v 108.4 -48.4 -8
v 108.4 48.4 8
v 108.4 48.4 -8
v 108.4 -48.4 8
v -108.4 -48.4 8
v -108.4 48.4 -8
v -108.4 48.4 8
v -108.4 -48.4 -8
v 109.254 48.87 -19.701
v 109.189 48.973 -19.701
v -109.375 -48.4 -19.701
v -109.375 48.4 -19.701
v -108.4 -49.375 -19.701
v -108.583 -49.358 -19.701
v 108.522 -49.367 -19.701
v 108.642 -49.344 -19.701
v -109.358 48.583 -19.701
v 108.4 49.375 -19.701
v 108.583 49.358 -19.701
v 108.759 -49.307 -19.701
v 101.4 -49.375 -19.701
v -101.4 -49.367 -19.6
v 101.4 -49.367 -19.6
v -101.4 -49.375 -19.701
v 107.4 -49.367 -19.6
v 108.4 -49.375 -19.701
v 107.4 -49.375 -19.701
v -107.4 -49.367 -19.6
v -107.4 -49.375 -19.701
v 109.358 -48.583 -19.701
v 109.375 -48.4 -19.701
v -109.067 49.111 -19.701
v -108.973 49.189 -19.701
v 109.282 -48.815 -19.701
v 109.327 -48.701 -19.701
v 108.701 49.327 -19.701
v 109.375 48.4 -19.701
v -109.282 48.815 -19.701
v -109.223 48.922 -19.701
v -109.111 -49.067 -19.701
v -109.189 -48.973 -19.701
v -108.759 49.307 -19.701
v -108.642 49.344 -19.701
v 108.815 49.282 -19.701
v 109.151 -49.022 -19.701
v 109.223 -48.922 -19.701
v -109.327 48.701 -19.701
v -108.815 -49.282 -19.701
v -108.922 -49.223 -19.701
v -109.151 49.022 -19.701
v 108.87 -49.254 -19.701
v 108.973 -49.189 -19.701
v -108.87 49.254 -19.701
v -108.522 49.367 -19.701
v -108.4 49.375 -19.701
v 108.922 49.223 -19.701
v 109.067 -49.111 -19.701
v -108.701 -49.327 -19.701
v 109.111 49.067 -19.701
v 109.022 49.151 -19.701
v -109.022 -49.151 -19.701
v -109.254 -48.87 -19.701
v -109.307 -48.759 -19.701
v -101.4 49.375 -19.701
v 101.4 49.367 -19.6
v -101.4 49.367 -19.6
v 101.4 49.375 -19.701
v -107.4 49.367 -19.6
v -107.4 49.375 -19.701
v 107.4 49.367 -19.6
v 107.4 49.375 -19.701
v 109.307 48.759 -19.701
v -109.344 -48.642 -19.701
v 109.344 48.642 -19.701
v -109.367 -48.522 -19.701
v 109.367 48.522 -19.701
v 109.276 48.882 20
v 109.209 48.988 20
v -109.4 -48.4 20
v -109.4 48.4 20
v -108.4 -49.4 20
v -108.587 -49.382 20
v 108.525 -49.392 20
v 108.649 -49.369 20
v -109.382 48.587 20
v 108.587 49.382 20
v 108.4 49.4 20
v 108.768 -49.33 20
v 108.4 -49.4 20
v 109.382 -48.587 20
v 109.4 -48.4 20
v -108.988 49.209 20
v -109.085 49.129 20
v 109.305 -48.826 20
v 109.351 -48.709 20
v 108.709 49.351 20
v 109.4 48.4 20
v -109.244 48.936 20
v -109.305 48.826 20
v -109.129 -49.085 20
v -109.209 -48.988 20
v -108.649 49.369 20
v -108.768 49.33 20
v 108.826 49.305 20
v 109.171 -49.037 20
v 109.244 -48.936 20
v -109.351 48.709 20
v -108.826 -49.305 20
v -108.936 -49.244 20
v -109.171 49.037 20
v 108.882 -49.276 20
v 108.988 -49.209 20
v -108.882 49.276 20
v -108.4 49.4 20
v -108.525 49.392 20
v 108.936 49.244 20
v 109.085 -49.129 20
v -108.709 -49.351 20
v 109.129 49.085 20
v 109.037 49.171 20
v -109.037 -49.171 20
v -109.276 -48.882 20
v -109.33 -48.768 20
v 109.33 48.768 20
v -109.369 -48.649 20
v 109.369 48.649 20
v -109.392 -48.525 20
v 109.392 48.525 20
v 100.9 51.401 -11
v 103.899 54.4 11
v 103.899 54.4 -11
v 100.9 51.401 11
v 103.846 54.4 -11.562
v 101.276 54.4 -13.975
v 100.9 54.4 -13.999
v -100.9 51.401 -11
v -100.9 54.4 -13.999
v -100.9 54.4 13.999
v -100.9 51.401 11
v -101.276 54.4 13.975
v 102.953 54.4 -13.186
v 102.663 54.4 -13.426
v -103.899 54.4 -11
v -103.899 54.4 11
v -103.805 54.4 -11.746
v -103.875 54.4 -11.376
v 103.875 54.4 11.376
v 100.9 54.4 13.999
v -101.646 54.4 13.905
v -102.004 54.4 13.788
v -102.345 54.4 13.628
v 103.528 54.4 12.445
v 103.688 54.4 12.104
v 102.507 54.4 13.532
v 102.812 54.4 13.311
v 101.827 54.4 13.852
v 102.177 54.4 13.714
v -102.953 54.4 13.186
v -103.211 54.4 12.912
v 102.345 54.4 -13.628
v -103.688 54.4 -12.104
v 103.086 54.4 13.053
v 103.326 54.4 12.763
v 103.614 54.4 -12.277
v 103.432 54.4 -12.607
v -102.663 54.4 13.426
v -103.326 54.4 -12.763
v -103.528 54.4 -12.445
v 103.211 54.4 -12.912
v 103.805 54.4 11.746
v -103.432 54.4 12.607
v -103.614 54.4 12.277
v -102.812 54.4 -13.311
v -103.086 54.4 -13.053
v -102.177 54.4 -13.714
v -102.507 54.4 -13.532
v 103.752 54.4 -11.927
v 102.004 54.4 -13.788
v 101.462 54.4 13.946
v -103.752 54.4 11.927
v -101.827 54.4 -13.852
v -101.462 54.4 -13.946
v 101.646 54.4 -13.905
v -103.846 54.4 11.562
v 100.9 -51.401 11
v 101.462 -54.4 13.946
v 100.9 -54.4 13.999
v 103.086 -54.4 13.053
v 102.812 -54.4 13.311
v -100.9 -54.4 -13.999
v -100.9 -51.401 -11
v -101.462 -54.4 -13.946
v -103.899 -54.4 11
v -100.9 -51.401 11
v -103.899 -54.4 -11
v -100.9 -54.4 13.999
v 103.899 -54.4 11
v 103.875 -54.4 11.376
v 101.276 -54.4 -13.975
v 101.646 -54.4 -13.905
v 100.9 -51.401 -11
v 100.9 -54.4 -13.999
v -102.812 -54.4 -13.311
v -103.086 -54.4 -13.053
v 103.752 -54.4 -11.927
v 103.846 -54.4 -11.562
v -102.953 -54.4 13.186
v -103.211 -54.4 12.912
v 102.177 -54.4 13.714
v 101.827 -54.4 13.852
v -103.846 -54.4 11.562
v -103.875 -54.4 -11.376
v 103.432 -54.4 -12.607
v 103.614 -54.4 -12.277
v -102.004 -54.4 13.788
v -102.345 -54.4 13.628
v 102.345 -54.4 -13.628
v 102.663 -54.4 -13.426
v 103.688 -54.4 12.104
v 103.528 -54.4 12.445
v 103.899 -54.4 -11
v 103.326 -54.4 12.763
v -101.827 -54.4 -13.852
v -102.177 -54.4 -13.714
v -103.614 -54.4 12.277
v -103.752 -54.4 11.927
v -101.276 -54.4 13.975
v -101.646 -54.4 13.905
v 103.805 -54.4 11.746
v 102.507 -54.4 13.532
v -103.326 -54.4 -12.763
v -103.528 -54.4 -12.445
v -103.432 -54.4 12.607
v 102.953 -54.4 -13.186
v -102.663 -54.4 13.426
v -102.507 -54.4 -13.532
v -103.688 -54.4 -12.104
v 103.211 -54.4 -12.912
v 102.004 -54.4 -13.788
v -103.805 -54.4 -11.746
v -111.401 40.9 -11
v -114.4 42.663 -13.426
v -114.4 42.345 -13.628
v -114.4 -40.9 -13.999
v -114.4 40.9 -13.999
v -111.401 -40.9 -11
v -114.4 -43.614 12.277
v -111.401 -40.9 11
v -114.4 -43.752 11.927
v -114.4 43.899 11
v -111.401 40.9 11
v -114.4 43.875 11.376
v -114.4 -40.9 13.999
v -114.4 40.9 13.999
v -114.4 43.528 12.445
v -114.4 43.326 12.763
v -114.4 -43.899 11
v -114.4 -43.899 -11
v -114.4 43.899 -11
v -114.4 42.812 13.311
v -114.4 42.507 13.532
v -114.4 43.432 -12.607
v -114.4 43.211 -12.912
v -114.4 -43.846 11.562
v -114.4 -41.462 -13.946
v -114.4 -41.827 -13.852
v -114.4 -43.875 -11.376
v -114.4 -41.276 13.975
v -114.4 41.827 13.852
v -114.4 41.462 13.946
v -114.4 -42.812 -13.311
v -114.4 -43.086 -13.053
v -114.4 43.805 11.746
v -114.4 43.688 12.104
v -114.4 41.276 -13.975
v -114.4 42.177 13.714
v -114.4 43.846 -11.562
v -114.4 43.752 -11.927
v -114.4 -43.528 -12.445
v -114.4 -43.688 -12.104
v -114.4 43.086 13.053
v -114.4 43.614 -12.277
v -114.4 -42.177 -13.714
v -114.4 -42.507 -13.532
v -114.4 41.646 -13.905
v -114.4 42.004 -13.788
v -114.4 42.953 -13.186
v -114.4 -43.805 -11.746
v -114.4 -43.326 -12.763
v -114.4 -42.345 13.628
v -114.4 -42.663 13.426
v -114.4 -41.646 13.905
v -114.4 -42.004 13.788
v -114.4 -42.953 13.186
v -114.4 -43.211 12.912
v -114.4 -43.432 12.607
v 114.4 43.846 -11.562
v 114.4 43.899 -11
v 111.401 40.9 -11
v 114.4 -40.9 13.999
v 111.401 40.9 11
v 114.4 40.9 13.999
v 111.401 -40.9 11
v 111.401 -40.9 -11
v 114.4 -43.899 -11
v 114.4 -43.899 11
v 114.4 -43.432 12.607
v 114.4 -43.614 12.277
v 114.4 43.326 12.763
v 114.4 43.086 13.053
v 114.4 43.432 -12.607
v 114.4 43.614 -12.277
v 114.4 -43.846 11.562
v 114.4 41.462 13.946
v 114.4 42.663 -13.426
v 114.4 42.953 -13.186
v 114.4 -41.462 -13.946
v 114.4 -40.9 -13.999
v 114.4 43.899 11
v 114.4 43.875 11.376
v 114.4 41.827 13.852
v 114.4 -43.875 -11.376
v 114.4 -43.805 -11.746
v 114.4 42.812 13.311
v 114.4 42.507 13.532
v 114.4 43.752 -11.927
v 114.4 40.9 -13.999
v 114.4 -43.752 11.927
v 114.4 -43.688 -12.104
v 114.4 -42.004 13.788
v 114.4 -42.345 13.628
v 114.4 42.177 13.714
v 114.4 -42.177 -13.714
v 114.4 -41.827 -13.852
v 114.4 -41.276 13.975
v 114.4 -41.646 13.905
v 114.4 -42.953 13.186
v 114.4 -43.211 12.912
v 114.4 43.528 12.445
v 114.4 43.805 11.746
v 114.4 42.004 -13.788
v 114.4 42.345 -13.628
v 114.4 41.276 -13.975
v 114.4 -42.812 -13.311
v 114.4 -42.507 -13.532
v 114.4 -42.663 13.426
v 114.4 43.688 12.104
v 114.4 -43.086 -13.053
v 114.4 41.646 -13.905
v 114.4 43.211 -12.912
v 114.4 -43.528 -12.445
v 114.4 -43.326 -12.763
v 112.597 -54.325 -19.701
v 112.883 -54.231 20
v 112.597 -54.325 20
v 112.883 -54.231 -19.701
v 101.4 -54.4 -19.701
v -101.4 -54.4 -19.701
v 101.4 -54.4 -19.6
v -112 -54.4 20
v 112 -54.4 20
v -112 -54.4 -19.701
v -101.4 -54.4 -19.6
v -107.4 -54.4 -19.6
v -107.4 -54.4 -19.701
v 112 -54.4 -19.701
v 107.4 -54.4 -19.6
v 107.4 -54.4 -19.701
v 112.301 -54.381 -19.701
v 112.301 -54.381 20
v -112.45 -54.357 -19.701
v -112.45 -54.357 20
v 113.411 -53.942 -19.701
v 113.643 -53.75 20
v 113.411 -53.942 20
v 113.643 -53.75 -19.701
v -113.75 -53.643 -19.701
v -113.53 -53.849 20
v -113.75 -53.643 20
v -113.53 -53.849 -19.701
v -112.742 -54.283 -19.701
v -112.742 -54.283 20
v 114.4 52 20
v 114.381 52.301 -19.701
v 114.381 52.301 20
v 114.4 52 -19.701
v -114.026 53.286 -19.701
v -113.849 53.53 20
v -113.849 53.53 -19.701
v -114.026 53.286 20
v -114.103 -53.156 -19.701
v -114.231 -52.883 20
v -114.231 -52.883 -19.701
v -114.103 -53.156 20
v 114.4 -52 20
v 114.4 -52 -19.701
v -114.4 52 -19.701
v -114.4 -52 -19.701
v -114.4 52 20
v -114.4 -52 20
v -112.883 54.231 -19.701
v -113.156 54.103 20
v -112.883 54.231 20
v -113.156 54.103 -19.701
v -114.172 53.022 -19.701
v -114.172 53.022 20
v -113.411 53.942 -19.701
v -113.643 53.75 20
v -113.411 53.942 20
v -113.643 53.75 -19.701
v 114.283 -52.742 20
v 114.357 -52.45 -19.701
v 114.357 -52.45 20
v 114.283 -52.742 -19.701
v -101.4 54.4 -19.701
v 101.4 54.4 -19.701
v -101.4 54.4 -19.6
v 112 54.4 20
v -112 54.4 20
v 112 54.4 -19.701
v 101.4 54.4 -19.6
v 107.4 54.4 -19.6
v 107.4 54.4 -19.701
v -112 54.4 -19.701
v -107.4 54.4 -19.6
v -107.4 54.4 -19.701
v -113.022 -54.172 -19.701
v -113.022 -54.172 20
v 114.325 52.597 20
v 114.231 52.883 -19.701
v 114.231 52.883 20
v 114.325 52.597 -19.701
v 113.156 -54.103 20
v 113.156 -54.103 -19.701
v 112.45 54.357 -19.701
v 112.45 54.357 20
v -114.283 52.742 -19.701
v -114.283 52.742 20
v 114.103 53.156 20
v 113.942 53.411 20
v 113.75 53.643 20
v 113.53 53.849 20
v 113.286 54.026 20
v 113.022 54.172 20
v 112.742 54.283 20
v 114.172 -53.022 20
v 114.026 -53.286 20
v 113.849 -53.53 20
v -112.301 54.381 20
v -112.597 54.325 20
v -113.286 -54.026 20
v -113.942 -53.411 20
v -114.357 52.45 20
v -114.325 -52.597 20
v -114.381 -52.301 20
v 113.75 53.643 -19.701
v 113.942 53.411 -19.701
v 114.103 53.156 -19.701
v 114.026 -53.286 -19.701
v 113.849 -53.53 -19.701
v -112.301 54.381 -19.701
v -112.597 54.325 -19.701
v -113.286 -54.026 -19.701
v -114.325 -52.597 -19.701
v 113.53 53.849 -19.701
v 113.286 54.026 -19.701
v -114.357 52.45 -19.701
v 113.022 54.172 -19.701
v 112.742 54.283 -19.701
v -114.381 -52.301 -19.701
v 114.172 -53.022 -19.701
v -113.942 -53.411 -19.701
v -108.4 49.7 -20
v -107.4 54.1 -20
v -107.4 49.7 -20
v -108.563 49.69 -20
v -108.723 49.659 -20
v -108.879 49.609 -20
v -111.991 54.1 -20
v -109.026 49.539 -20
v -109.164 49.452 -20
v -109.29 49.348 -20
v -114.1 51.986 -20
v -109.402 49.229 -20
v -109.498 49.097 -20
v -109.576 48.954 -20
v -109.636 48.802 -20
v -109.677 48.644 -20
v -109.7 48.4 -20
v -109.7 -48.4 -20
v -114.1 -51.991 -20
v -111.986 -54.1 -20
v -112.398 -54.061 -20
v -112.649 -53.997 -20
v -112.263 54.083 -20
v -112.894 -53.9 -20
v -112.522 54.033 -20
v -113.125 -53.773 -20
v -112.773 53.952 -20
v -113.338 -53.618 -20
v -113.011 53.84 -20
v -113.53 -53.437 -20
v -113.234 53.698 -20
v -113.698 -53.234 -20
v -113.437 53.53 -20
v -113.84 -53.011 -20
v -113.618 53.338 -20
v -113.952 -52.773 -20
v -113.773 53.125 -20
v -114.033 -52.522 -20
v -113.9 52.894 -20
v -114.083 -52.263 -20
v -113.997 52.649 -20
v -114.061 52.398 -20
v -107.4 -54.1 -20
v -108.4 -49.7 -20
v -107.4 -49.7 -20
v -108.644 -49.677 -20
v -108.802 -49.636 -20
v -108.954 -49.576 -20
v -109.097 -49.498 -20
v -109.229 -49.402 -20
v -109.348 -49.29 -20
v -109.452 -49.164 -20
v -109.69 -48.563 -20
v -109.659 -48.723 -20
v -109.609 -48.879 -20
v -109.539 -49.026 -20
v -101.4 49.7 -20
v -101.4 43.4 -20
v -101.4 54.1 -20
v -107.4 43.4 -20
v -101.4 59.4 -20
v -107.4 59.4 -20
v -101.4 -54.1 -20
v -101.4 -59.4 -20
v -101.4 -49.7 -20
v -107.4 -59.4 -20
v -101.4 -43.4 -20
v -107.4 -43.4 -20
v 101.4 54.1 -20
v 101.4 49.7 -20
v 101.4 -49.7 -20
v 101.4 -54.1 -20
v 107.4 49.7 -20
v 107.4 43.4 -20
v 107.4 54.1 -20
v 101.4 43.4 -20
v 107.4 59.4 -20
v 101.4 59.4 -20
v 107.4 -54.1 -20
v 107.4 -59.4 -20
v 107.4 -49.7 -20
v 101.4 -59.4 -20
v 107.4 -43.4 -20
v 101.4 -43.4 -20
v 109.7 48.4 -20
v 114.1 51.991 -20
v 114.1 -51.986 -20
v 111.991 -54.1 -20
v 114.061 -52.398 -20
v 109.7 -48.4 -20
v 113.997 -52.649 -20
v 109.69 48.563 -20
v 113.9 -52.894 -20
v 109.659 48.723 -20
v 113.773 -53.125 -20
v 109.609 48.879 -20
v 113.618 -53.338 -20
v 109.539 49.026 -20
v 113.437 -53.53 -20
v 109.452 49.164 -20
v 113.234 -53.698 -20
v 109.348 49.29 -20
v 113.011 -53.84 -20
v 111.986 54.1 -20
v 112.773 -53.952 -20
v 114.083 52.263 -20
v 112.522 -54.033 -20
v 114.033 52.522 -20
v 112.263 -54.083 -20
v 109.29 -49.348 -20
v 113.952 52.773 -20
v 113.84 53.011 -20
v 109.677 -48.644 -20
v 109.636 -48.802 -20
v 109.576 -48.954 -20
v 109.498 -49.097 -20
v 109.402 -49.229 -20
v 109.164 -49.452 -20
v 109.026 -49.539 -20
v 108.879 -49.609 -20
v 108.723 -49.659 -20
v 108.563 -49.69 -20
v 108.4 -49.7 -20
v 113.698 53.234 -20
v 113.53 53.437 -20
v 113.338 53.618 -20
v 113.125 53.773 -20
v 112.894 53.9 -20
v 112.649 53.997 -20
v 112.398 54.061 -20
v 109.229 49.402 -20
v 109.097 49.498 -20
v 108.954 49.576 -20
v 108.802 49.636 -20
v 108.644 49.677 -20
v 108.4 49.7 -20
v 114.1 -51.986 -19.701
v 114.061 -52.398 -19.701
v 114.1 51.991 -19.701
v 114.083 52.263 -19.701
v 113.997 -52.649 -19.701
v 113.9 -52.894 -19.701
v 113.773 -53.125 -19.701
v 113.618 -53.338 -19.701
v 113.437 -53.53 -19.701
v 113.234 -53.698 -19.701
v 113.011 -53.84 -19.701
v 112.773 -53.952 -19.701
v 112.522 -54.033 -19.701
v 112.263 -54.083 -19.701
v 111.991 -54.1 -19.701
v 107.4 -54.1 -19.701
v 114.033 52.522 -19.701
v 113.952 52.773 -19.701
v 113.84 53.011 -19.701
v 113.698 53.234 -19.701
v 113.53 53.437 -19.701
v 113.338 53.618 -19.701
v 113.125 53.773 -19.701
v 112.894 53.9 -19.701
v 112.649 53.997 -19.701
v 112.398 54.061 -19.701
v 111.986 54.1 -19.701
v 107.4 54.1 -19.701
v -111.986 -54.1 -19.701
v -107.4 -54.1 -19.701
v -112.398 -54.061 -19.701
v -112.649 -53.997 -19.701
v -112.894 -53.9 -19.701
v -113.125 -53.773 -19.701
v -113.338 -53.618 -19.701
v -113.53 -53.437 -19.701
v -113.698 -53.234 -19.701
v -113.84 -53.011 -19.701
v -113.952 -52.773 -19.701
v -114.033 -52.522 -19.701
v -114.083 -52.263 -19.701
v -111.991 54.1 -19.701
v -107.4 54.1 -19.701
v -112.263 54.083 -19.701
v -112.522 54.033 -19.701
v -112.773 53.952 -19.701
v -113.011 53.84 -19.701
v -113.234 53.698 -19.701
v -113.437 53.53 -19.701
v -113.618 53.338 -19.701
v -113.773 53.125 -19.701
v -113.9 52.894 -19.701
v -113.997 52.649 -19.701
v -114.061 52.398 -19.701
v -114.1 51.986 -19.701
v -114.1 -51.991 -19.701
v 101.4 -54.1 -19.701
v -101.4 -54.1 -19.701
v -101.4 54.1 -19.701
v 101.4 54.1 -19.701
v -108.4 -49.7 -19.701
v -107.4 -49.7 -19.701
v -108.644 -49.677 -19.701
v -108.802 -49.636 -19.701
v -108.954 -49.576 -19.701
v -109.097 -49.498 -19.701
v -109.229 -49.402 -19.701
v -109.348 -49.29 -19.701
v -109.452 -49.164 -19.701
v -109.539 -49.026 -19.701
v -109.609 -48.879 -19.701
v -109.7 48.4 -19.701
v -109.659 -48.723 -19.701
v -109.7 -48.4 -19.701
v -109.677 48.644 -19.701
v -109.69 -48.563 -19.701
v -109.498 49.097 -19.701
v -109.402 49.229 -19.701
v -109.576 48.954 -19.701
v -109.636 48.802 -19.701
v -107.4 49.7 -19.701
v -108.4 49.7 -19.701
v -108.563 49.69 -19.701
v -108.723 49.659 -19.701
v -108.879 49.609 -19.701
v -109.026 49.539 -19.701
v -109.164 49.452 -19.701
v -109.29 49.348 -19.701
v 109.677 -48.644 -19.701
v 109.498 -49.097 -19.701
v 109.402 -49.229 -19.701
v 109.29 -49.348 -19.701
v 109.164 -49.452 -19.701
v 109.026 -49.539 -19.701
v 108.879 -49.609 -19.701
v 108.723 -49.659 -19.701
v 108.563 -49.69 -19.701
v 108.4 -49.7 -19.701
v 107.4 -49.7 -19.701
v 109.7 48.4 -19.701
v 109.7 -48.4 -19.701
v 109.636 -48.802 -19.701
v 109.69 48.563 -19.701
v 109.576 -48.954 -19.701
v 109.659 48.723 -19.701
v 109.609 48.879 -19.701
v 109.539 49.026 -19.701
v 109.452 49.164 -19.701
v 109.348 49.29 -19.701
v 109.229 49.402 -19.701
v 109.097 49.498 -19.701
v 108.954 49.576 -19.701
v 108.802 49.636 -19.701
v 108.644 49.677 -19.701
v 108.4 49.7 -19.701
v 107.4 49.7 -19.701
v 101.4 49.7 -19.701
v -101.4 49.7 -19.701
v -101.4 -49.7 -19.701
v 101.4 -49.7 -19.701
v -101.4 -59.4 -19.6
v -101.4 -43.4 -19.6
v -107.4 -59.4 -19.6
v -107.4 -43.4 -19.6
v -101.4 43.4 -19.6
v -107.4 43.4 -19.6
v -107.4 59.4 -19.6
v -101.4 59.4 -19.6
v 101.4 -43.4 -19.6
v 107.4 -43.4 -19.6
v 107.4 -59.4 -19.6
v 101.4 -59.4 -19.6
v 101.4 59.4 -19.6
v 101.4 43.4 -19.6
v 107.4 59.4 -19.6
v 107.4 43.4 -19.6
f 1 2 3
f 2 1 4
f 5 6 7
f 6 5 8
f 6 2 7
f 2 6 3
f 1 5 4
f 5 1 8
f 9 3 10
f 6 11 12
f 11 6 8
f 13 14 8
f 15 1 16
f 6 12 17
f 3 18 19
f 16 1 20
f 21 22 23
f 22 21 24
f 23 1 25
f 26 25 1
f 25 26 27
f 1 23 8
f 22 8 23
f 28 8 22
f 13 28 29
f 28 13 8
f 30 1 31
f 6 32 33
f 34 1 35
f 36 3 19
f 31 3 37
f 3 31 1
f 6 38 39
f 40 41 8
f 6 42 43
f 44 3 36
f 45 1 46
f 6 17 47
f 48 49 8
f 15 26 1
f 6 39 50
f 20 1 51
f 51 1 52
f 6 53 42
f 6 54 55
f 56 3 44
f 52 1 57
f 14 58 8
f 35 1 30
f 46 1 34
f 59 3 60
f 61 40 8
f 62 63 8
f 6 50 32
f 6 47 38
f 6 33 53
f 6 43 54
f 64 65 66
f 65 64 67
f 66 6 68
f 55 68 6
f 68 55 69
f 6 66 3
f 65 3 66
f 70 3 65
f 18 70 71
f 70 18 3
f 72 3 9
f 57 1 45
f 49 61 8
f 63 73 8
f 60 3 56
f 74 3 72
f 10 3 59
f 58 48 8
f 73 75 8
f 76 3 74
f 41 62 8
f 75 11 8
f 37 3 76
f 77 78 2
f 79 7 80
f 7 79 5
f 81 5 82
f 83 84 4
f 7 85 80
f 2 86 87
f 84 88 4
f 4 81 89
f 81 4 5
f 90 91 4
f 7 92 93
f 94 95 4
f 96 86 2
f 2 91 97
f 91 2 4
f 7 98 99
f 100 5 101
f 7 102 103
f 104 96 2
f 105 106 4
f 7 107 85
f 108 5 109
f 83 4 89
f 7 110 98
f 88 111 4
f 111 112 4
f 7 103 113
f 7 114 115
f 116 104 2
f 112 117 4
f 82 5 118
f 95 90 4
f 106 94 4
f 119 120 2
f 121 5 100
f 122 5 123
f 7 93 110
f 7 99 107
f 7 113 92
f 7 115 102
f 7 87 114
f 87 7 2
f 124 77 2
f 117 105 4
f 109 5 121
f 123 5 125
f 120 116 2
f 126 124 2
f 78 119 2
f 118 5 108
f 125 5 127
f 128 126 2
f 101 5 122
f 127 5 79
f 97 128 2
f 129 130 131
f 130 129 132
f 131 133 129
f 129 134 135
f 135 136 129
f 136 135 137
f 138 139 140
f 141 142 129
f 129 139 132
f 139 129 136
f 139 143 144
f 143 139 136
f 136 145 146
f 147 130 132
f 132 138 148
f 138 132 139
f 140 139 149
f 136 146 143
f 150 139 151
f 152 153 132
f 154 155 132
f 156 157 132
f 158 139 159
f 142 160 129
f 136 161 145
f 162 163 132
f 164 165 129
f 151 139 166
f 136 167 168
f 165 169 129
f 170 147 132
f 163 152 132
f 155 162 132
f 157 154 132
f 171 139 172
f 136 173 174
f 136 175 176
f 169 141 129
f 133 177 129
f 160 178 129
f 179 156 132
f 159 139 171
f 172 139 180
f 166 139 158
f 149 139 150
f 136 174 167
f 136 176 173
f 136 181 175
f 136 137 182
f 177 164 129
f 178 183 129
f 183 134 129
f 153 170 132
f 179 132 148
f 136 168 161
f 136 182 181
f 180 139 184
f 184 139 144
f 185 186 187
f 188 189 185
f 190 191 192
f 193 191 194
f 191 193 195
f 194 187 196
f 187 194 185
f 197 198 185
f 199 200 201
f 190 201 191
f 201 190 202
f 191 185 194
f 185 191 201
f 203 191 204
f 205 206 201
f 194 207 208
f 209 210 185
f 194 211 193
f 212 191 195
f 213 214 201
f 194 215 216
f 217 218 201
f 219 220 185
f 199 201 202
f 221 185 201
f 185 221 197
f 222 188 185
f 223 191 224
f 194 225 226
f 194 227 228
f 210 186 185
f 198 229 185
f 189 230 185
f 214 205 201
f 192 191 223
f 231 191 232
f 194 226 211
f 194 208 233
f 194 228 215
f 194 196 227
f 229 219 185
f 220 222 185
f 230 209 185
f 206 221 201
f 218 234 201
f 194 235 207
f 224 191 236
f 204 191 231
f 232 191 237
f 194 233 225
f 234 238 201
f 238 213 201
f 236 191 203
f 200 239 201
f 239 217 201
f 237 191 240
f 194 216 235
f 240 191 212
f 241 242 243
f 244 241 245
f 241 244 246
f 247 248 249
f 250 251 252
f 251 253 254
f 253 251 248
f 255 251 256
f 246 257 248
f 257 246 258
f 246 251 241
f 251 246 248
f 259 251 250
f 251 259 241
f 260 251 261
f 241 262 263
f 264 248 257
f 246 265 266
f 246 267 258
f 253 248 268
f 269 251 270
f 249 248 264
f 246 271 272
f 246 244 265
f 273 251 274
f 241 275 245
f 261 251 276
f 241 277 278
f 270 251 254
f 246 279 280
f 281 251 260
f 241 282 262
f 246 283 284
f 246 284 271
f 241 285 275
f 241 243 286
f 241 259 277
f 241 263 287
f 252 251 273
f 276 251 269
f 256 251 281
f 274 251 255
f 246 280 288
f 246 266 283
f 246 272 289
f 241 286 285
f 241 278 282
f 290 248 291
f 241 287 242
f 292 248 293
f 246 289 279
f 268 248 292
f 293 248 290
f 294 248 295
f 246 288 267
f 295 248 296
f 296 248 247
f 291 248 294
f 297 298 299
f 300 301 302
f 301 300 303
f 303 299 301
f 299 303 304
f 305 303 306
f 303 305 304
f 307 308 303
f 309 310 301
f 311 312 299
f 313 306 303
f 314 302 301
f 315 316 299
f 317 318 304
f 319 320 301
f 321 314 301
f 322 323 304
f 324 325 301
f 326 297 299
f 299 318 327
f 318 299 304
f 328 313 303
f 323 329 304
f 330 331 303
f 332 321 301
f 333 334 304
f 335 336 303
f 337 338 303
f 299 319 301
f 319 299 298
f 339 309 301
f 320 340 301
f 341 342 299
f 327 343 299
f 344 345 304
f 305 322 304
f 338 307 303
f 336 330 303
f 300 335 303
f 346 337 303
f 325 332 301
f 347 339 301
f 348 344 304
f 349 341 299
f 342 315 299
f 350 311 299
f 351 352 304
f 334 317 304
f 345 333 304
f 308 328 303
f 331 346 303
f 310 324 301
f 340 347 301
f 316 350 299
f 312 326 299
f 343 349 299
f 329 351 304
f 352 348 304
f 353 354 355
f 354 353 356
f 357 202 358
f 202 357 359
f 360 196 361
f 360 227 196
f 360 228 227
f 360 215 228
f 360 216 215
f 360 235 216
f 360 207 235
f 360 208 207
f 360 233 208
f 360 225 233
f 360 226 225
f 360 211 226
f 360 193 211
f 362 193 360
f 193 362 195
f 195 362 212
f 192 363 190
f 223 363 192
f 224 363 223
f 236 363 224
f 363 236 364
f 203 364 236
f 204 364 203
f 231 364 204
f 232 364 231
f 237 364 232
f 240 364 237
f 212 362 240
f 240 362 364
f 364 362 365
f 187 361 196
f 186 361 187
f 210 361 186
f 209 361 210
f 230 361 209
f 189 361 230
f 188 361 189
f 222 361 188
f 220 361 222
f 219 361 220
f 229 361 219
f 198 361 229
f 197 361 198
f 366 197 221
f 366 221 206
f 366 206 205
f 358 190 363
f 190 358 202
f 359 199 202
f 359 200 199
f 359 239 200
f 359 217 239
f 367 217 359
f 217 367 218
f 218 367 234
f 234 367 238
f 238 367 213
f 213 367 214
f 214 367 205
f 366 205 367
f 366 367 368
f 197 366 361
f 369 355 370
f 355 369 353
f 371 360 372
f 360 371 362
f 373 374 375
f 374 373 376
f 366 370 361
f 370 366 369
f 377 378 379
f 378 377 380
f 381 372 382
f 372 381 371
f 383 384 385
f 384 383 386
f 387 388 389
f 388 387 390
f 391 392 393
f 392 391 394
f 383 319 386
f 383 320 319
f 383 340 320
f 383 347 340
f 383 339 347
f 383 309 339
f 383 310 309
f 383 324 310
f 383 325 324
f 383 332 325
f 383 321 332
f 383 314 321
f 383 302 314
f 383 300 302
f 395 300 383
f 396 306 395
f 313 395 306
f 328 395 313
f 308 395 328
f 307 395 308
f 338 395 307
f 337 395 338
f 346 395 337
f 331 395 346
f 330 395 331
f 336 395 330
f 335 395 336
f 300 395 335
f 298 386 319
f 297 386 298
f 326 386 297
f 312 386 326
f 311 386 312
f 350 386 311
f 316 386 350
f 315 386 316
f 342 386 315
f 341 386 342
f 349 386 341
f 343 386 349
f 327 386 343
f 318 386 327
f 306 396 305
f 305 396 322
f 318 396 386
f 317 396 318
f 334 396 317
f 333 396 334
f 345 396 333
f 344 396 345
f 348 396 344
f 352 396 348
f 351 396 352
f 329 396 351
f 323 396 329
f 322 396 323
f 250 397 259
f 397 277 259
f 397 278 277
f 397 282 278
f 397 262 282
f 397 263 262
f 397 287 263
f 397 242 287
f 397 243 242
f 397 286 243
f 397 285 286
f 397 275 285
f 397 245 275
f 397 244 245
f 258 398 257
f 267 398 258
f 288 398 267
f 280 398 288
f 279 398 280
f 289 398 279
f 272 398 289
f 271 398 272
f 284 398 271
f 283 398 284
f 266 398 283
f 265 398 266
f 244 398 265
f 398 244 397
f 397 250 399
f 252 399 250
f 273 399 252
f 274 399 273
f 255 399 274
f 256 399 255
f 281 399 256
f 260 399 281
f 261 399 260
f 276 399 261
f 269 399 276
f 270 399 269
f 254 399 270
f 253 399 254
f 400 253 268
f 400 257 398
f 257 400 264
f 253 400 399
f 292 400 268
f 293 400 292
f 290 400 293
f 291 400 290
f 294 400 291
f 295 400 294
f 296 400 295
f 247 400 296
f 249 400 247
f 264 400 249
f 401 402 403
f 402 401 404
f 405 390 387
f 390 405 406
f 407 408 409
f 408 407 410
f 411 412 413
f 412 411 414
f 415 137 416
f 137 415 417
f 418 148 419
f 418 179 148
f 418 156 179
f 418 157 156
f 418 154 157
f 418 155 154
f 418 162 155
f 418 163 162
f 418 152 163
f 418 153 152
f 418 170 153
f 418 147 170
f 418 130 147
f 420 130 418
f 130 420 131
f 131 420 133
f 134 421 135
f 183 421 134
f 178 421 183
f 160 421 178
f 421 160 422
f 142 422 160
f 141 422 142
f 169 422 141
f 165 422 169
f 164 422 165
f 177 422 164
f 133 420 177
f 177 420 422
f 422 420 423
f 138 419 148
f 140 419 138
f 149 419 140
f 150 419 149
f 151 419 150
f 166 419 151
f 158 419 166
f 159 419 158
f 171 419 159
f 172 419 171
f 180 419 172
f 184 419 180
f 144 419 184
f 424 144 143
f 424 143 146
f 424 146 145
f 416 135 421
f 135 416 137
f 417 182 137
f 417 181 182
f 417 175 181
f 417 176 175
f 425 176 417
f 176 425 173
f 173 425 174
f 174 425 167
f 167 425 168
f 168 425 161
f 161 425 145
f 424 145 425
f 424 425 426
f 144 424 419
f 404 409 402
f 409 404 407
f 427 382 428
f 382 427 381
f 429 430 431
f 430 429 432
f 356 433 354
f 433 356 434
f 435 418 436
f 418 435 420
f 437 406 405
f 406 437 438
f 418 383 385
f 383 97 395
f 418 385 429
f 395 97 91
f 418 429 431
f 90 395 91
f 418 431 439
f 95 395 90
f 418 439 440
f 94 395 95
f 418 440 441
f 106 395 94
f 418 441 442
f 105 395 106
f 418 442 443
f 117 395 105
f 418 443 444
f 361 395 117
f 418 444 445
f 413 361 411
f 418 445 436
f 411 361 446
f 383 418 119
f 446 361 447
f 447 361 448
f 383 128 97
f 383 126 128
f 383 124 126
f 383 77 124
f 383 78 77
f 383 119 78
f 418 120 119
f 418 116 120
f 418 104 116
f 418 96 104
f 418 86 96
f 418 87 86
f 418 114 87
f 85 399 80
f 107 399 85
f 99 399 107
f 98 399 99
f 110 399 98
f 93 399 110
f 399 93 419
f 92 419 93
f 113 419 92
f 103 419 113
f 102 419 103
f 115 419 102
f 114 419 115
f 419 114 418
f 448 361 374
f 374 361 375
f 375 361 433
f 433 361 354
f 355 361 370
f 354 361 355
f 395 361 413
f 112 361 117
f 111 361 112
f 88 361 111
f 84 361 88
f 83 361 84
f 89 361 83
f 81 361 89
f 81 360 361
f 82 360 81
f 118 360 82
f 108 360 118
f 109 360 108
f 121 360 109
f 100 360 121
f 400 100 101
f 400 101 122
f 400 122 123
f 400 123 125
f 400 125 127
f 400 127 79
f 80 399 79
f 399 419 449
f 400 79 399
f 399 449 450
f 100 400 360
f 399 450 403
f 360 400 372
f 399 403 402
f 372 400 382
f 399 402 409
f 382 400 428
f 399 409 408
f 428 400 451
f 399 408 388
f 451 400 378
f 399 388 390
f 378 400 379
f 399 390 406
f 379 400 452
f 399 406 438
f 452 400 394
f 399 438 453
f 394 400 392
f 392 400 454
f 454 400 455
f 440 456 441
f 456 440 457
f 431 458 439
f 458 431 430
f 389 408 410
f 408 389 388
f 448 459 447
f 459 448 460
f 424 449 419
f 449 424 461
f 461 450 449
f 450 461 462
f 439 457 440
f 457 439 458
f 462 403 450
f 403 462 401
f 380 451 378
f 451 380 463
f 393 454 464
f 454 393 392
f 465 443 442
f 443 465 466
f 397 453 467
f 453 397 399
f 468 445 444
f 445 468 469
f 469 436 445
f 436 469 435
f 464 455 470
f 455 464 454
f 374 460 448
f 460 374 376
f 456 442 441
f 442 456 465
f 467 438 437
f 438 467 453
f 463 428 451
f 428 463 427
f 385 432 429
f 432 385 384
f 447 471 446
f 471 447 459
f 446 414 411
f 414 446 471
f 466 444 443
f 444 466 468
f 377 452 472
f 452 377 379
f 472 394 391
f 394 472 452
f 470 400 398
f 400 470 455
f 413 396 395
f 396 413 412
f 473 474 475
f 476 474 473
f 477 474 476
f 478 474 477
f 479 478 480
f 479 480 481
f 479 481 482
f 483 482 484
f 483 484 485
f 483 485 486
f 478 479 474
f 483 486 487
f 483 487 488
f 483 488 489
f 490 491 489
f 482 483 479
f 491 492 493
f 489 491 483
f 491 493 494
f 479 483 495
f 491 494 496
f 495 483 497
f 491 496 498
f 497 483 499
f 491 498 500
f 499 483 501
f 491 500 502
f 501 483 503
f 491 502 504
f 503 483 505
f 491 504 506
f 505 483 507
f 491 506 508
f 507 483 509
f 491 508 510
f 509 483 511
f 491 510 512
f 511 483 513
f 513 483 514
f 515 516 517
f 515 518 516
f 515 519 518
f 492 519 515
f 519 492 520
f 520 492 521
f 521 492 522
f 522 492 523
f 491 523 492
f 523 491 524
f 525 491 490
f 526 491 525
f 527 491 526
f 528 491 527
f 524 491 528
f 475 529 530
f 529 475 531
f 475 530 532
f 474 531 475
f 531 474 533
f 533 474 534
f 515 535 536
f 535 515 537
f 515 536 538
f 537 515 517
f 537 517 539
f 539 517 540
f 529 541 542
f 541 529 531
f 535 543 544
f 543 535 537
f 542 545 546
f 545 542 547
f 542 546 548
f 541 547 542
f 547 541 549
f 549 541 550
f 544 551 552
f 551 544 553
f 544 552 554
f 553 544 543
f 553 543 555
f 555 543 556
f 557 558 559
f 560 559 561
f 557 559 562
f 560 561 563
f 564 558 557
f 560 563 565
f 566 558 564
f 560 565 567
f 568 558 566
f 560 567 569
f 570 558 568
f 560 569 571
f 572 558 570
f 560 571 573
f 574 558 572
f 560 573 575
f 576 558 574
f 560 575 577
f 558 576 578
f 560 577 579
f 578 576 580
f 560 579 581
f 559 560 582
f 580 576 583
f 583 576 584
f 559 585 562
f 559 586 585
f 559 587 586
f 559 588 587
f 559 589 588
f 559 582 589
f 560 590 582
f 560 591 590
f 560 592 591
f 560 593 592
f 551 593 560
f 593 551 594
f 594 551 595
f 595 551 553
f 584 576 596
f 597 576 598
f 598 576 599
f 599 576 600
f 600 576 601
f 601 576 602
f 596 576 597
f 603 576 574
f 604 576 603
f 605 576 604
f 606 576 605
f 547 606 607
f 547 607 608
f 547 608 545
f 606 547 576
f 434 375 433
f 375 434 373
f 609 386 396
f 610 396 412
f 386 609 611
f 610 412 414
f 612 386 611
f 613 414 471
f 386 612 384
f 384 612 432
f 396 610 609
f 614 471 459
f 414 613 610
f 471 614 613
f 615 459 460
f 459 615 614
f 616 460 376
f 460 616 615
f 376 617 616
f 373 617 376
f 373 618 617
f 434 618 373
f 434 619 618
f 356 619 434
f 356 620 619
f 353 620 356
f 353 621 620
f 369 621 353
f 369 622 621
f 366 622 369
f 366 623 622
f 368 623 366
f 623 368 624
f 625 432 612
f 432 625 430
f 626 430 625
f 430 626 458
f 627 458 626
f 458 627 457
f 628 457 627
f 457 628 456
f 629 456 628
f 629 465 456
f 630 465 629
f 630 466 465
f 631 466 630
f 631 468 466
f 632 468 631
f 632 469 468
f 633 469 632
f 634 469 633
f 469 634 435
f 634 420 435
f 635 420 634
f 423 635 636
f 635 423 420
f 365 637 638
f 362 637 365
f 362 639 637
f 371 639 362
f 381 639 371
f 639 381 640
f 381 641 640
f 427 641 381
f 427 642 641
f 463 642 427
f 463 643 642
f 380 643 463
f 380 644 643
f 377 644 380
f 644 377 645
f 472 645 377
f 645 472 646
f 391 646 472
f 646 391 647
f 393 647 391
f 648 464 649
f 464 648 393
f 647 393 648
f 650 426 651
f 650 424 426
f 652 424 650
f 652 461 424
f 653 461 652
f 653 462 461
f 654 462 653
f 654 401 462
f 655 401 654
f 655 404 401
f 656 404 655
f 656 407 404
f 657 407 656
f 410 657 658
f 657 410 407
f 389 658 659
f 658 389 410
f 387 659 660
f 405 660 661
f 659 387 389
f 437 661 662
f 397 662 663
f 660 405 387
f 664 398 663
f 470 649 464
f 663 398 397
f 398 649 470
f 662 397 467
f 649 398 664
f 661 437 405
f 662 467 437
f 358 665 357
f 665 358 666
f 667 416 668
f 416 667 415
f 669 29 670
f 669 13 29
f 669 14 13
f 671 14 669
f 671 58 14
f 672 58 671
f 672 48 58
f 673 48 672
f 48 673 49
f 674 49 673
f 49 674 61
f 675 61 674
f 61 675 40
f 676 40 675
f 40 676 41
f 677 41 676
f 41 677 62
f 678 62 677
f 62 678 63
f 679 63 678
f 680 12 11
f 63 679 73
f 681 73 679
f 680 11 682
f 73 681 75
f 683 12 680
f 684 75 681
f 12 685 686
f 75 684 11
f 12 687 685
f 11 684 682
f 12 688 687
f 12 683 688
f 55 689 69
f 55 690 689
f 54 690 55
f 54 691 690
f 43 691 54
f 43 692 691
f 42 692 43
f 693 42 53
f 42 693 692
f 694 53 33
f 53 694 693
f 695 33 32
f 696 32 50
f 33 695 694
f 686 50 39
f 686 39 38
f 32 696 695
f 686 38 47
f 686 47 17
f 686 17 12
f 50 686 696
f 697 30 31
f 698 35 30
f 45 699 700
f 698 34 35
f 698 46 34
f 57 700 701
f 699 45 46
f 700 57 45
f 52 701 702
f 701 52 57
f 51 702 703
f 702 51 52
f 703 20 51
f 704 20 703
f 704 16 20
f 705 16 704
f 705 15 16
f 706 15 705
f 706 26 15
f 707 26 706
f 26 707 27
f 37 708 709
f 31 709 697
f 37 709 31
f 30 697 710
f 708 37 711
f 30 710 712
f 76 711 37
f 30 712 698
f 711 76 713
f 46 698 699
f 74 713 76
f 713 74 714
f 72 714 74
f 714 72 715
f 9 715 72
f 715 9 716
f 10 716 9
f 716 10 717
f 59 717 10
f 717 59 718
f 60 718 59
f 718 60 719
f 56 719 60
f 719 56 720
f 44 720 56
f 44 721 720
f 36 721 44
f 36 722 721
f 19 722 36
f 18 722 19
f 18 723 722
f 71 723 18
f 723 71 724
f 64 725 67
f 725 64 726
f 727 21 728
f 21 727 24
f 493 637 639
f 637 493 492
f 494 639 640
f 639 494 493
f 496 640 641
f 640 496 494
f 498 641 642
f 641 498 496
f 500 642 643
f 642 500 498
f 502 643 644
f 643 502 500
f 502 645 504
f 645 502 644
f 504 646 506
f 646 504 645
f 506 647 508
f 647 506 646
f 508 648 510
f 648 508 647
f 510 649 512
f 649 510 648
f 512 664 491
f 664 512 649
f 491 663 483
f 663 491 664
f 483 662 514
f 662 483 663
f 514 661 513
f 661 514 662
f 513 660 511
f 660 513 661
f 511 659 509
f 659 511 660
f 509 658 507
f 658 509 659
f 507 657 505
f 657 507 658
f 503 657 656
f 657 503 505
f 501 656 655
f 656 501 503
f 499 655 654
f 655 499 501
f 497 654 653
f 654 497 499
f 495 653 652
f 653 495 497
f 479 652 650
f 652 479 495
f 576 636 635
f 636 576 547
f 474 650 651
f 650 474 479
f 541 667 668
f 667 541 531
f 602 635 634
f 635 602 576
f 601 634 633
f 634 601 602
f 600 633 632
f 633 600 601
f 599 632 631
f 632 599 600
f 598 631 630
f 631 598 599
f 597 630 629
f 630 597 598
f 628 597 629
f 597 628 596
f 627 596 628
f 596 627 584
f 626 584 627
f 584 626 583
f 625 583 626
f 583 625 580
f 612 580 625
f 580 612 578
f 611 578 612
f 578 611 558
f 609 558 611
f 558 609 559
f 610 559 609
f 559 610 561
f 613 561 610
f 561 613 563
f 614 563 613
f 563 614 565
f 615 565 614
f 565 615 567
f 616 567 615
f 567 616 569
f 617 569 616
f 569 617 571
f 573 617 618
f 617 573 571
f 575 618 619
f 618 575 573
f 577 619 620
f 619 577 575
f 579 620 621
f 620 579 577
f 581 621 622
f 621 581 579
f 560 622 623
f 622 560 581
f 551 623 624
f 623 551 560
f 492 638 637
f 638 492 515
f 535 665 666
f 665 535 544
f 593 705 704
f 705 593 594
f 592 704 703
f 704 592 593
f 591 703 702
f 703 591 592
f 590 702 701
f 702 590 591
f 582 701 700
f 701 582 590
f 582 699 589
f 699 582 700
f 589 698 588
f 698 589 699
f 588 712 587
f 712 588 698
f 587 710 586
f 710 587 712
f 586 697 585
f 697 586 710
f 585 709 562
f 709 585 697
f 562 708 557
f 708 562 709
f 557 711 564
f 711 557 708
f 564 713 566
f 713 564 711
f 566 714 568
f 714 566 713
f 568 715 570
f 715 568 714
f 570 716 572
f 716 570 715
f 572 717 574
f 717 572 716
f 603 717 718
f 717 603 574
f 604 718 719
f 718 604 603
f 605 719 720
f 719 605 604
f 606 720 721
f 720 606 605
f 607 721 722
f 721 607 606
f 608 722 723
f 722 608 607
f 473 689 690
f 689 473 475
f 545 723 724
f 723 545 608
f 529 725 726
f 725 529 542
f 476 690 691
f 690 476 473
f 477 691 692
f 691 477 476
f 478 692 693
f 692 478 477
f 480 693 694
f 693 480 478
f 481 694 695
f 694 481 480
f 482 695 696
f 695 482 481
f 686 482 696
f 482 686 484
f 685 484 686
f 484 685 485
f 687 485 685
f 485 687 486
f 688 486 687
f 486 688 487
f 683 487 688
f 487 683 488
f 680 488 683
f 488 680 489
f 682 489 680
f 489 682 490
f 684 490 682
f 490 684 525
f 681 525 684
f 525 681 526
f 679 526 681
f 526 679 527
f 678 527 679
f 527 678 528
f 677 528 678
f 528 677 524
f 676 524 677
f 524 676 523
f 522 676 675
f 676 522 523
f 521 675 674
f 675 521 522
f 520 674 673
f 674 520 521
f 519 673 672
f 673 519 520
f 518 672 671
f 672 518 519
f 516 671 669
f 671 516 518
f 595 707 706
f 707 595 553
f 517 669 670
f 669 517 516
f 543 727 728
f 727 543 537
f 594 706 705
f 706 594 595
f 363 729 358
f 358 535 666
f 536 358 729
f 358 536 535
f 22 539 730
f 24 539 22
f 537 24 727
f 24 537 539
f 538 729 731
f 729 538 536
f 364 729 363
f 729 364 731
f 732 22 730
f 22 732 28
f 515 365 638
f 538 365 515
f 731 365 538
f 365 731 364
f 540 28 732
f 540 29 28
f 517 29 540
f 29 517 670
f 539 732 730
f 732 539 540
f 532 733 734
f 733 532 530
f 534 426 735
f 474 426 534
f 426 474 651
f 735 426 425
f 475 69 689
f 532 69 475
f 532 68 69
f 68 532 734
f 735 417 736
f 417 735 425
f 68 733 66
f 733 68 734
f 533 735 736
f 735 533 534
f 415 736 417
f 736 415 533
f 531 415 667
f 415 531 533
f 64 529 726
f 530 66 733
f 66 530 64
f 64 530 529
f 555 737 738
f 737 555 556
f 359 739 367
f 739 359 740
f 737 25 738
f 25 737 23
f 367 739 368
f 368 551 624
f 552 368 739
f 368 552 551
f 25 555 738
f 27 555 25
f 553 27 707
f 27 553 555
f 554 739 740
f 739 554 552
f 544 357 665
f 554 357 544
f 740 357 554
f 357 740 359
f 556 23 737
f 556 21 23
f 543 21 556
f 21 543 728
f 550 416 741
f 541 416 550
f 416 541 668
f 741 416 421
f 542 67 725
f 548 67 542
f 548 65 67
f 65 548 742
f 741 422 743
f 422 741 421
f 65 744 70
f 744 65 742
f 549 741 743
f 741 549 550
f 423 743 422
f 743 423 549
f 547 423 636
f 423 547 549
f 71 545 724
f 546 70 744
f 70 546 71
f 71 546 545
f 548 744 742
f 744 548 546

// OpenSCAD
// Deck box is 96x72x20 mm.
// Add clearance of 1.3mm in the x and y directions.

eps = 0.001;
$fn = 50;

height = 40;
interior_dims = [3*72 + 0.8, 96 + 0.8];
wall = 6;

module interior_2d() {
  square(interior_dims, center=true);
}


module exterior_2d() {
  offset(wall*0.4)
    offset(delta=wall*0.6)
      interior_2d();
}

coffer_depth = wall - 3;

module long_coffer_2d() {
  square([interior_dims.x - 5*coffer_depth, height - 2*wall - 2*coffer_depth], center=true);
}

module short_coffer_2d() {
  square([height - 2*wall - 2*coffer_depth, interior_dims.y - 5*coffer_depth], center=true);
}

difference() {
  translate([0, 0, -height/2])
    linear_extrude(height)
      exterior_2d();
  
  for (a = [-1, 1]) {
    scale([1, 1, a]) {
      hull() {
        translate([0, 0, -eps])
          linear_extrude(eps)
            interior_2d();
        
        translate([0, 0, height/5])
          linear_extrude(eps)
            interior_2d();
      }
      hull() {
        translate([0, 0, height/5])
          linear_extrude(eps)
            interior_2d();
        
        translate([0, 0, height/2])
          linear_extrude(eps)
            offset(1)
              interior_2d();
      }
    }
  }
  
  // Build plate chamfers.
  translate([0, 0, -height/2-eps]) {
    linear_extrude(0.3) {
      offset(1.3)
        interior_2d();
      
      difference() {
        offset(10)
          exterior_2d();
        offset(-0.3)
          exterior_2d();
      }
    }
  }
  
  // Long wall coffers.
  for (a = [-1, 1]) {
    scale([1, a, 1]) {
      translate([0, -interior_dims.y/2 - wall + coffer_depth - eps, 0]) {
        rotate([90, 0, 0]) {
          hull() {
            linear_extrude(eps)
              long_coffer_2d();
            translate([0, 0, coffer_depth])
              linear_extrude(eps)
                offset(coffer_depth)
                  long_coffer_2d();
          }
        }
      }
    }
  }
  
  // Short wall coffers.
  for (a = [-1, 1]) {
    scale([a, 1, 1]) {
      translate([interior_dims.x/2 + wall - coffer_depth + eps, 0, 0]) {
        rotate([0, 90, 0]) {
          hull() {
            linear_extrude(eps)
              short_coffer_2d();
            translate([0, 0, coffer_depth])
              linear_extrude(eps)
                offset(coffer_depth)
                  short_coffer_2d();
          }
        }
      }
    }
  }
}


// Brims.
for (a = [-1, 1], b = [-1, 1])
  scale([a, b, 1])
    translate([interior_dims.x/2 - 4, interior_dims.y/2 + wall/2, -height/2])
      linear_extrude(0.4)
        square([6, wall+10], center=true);
